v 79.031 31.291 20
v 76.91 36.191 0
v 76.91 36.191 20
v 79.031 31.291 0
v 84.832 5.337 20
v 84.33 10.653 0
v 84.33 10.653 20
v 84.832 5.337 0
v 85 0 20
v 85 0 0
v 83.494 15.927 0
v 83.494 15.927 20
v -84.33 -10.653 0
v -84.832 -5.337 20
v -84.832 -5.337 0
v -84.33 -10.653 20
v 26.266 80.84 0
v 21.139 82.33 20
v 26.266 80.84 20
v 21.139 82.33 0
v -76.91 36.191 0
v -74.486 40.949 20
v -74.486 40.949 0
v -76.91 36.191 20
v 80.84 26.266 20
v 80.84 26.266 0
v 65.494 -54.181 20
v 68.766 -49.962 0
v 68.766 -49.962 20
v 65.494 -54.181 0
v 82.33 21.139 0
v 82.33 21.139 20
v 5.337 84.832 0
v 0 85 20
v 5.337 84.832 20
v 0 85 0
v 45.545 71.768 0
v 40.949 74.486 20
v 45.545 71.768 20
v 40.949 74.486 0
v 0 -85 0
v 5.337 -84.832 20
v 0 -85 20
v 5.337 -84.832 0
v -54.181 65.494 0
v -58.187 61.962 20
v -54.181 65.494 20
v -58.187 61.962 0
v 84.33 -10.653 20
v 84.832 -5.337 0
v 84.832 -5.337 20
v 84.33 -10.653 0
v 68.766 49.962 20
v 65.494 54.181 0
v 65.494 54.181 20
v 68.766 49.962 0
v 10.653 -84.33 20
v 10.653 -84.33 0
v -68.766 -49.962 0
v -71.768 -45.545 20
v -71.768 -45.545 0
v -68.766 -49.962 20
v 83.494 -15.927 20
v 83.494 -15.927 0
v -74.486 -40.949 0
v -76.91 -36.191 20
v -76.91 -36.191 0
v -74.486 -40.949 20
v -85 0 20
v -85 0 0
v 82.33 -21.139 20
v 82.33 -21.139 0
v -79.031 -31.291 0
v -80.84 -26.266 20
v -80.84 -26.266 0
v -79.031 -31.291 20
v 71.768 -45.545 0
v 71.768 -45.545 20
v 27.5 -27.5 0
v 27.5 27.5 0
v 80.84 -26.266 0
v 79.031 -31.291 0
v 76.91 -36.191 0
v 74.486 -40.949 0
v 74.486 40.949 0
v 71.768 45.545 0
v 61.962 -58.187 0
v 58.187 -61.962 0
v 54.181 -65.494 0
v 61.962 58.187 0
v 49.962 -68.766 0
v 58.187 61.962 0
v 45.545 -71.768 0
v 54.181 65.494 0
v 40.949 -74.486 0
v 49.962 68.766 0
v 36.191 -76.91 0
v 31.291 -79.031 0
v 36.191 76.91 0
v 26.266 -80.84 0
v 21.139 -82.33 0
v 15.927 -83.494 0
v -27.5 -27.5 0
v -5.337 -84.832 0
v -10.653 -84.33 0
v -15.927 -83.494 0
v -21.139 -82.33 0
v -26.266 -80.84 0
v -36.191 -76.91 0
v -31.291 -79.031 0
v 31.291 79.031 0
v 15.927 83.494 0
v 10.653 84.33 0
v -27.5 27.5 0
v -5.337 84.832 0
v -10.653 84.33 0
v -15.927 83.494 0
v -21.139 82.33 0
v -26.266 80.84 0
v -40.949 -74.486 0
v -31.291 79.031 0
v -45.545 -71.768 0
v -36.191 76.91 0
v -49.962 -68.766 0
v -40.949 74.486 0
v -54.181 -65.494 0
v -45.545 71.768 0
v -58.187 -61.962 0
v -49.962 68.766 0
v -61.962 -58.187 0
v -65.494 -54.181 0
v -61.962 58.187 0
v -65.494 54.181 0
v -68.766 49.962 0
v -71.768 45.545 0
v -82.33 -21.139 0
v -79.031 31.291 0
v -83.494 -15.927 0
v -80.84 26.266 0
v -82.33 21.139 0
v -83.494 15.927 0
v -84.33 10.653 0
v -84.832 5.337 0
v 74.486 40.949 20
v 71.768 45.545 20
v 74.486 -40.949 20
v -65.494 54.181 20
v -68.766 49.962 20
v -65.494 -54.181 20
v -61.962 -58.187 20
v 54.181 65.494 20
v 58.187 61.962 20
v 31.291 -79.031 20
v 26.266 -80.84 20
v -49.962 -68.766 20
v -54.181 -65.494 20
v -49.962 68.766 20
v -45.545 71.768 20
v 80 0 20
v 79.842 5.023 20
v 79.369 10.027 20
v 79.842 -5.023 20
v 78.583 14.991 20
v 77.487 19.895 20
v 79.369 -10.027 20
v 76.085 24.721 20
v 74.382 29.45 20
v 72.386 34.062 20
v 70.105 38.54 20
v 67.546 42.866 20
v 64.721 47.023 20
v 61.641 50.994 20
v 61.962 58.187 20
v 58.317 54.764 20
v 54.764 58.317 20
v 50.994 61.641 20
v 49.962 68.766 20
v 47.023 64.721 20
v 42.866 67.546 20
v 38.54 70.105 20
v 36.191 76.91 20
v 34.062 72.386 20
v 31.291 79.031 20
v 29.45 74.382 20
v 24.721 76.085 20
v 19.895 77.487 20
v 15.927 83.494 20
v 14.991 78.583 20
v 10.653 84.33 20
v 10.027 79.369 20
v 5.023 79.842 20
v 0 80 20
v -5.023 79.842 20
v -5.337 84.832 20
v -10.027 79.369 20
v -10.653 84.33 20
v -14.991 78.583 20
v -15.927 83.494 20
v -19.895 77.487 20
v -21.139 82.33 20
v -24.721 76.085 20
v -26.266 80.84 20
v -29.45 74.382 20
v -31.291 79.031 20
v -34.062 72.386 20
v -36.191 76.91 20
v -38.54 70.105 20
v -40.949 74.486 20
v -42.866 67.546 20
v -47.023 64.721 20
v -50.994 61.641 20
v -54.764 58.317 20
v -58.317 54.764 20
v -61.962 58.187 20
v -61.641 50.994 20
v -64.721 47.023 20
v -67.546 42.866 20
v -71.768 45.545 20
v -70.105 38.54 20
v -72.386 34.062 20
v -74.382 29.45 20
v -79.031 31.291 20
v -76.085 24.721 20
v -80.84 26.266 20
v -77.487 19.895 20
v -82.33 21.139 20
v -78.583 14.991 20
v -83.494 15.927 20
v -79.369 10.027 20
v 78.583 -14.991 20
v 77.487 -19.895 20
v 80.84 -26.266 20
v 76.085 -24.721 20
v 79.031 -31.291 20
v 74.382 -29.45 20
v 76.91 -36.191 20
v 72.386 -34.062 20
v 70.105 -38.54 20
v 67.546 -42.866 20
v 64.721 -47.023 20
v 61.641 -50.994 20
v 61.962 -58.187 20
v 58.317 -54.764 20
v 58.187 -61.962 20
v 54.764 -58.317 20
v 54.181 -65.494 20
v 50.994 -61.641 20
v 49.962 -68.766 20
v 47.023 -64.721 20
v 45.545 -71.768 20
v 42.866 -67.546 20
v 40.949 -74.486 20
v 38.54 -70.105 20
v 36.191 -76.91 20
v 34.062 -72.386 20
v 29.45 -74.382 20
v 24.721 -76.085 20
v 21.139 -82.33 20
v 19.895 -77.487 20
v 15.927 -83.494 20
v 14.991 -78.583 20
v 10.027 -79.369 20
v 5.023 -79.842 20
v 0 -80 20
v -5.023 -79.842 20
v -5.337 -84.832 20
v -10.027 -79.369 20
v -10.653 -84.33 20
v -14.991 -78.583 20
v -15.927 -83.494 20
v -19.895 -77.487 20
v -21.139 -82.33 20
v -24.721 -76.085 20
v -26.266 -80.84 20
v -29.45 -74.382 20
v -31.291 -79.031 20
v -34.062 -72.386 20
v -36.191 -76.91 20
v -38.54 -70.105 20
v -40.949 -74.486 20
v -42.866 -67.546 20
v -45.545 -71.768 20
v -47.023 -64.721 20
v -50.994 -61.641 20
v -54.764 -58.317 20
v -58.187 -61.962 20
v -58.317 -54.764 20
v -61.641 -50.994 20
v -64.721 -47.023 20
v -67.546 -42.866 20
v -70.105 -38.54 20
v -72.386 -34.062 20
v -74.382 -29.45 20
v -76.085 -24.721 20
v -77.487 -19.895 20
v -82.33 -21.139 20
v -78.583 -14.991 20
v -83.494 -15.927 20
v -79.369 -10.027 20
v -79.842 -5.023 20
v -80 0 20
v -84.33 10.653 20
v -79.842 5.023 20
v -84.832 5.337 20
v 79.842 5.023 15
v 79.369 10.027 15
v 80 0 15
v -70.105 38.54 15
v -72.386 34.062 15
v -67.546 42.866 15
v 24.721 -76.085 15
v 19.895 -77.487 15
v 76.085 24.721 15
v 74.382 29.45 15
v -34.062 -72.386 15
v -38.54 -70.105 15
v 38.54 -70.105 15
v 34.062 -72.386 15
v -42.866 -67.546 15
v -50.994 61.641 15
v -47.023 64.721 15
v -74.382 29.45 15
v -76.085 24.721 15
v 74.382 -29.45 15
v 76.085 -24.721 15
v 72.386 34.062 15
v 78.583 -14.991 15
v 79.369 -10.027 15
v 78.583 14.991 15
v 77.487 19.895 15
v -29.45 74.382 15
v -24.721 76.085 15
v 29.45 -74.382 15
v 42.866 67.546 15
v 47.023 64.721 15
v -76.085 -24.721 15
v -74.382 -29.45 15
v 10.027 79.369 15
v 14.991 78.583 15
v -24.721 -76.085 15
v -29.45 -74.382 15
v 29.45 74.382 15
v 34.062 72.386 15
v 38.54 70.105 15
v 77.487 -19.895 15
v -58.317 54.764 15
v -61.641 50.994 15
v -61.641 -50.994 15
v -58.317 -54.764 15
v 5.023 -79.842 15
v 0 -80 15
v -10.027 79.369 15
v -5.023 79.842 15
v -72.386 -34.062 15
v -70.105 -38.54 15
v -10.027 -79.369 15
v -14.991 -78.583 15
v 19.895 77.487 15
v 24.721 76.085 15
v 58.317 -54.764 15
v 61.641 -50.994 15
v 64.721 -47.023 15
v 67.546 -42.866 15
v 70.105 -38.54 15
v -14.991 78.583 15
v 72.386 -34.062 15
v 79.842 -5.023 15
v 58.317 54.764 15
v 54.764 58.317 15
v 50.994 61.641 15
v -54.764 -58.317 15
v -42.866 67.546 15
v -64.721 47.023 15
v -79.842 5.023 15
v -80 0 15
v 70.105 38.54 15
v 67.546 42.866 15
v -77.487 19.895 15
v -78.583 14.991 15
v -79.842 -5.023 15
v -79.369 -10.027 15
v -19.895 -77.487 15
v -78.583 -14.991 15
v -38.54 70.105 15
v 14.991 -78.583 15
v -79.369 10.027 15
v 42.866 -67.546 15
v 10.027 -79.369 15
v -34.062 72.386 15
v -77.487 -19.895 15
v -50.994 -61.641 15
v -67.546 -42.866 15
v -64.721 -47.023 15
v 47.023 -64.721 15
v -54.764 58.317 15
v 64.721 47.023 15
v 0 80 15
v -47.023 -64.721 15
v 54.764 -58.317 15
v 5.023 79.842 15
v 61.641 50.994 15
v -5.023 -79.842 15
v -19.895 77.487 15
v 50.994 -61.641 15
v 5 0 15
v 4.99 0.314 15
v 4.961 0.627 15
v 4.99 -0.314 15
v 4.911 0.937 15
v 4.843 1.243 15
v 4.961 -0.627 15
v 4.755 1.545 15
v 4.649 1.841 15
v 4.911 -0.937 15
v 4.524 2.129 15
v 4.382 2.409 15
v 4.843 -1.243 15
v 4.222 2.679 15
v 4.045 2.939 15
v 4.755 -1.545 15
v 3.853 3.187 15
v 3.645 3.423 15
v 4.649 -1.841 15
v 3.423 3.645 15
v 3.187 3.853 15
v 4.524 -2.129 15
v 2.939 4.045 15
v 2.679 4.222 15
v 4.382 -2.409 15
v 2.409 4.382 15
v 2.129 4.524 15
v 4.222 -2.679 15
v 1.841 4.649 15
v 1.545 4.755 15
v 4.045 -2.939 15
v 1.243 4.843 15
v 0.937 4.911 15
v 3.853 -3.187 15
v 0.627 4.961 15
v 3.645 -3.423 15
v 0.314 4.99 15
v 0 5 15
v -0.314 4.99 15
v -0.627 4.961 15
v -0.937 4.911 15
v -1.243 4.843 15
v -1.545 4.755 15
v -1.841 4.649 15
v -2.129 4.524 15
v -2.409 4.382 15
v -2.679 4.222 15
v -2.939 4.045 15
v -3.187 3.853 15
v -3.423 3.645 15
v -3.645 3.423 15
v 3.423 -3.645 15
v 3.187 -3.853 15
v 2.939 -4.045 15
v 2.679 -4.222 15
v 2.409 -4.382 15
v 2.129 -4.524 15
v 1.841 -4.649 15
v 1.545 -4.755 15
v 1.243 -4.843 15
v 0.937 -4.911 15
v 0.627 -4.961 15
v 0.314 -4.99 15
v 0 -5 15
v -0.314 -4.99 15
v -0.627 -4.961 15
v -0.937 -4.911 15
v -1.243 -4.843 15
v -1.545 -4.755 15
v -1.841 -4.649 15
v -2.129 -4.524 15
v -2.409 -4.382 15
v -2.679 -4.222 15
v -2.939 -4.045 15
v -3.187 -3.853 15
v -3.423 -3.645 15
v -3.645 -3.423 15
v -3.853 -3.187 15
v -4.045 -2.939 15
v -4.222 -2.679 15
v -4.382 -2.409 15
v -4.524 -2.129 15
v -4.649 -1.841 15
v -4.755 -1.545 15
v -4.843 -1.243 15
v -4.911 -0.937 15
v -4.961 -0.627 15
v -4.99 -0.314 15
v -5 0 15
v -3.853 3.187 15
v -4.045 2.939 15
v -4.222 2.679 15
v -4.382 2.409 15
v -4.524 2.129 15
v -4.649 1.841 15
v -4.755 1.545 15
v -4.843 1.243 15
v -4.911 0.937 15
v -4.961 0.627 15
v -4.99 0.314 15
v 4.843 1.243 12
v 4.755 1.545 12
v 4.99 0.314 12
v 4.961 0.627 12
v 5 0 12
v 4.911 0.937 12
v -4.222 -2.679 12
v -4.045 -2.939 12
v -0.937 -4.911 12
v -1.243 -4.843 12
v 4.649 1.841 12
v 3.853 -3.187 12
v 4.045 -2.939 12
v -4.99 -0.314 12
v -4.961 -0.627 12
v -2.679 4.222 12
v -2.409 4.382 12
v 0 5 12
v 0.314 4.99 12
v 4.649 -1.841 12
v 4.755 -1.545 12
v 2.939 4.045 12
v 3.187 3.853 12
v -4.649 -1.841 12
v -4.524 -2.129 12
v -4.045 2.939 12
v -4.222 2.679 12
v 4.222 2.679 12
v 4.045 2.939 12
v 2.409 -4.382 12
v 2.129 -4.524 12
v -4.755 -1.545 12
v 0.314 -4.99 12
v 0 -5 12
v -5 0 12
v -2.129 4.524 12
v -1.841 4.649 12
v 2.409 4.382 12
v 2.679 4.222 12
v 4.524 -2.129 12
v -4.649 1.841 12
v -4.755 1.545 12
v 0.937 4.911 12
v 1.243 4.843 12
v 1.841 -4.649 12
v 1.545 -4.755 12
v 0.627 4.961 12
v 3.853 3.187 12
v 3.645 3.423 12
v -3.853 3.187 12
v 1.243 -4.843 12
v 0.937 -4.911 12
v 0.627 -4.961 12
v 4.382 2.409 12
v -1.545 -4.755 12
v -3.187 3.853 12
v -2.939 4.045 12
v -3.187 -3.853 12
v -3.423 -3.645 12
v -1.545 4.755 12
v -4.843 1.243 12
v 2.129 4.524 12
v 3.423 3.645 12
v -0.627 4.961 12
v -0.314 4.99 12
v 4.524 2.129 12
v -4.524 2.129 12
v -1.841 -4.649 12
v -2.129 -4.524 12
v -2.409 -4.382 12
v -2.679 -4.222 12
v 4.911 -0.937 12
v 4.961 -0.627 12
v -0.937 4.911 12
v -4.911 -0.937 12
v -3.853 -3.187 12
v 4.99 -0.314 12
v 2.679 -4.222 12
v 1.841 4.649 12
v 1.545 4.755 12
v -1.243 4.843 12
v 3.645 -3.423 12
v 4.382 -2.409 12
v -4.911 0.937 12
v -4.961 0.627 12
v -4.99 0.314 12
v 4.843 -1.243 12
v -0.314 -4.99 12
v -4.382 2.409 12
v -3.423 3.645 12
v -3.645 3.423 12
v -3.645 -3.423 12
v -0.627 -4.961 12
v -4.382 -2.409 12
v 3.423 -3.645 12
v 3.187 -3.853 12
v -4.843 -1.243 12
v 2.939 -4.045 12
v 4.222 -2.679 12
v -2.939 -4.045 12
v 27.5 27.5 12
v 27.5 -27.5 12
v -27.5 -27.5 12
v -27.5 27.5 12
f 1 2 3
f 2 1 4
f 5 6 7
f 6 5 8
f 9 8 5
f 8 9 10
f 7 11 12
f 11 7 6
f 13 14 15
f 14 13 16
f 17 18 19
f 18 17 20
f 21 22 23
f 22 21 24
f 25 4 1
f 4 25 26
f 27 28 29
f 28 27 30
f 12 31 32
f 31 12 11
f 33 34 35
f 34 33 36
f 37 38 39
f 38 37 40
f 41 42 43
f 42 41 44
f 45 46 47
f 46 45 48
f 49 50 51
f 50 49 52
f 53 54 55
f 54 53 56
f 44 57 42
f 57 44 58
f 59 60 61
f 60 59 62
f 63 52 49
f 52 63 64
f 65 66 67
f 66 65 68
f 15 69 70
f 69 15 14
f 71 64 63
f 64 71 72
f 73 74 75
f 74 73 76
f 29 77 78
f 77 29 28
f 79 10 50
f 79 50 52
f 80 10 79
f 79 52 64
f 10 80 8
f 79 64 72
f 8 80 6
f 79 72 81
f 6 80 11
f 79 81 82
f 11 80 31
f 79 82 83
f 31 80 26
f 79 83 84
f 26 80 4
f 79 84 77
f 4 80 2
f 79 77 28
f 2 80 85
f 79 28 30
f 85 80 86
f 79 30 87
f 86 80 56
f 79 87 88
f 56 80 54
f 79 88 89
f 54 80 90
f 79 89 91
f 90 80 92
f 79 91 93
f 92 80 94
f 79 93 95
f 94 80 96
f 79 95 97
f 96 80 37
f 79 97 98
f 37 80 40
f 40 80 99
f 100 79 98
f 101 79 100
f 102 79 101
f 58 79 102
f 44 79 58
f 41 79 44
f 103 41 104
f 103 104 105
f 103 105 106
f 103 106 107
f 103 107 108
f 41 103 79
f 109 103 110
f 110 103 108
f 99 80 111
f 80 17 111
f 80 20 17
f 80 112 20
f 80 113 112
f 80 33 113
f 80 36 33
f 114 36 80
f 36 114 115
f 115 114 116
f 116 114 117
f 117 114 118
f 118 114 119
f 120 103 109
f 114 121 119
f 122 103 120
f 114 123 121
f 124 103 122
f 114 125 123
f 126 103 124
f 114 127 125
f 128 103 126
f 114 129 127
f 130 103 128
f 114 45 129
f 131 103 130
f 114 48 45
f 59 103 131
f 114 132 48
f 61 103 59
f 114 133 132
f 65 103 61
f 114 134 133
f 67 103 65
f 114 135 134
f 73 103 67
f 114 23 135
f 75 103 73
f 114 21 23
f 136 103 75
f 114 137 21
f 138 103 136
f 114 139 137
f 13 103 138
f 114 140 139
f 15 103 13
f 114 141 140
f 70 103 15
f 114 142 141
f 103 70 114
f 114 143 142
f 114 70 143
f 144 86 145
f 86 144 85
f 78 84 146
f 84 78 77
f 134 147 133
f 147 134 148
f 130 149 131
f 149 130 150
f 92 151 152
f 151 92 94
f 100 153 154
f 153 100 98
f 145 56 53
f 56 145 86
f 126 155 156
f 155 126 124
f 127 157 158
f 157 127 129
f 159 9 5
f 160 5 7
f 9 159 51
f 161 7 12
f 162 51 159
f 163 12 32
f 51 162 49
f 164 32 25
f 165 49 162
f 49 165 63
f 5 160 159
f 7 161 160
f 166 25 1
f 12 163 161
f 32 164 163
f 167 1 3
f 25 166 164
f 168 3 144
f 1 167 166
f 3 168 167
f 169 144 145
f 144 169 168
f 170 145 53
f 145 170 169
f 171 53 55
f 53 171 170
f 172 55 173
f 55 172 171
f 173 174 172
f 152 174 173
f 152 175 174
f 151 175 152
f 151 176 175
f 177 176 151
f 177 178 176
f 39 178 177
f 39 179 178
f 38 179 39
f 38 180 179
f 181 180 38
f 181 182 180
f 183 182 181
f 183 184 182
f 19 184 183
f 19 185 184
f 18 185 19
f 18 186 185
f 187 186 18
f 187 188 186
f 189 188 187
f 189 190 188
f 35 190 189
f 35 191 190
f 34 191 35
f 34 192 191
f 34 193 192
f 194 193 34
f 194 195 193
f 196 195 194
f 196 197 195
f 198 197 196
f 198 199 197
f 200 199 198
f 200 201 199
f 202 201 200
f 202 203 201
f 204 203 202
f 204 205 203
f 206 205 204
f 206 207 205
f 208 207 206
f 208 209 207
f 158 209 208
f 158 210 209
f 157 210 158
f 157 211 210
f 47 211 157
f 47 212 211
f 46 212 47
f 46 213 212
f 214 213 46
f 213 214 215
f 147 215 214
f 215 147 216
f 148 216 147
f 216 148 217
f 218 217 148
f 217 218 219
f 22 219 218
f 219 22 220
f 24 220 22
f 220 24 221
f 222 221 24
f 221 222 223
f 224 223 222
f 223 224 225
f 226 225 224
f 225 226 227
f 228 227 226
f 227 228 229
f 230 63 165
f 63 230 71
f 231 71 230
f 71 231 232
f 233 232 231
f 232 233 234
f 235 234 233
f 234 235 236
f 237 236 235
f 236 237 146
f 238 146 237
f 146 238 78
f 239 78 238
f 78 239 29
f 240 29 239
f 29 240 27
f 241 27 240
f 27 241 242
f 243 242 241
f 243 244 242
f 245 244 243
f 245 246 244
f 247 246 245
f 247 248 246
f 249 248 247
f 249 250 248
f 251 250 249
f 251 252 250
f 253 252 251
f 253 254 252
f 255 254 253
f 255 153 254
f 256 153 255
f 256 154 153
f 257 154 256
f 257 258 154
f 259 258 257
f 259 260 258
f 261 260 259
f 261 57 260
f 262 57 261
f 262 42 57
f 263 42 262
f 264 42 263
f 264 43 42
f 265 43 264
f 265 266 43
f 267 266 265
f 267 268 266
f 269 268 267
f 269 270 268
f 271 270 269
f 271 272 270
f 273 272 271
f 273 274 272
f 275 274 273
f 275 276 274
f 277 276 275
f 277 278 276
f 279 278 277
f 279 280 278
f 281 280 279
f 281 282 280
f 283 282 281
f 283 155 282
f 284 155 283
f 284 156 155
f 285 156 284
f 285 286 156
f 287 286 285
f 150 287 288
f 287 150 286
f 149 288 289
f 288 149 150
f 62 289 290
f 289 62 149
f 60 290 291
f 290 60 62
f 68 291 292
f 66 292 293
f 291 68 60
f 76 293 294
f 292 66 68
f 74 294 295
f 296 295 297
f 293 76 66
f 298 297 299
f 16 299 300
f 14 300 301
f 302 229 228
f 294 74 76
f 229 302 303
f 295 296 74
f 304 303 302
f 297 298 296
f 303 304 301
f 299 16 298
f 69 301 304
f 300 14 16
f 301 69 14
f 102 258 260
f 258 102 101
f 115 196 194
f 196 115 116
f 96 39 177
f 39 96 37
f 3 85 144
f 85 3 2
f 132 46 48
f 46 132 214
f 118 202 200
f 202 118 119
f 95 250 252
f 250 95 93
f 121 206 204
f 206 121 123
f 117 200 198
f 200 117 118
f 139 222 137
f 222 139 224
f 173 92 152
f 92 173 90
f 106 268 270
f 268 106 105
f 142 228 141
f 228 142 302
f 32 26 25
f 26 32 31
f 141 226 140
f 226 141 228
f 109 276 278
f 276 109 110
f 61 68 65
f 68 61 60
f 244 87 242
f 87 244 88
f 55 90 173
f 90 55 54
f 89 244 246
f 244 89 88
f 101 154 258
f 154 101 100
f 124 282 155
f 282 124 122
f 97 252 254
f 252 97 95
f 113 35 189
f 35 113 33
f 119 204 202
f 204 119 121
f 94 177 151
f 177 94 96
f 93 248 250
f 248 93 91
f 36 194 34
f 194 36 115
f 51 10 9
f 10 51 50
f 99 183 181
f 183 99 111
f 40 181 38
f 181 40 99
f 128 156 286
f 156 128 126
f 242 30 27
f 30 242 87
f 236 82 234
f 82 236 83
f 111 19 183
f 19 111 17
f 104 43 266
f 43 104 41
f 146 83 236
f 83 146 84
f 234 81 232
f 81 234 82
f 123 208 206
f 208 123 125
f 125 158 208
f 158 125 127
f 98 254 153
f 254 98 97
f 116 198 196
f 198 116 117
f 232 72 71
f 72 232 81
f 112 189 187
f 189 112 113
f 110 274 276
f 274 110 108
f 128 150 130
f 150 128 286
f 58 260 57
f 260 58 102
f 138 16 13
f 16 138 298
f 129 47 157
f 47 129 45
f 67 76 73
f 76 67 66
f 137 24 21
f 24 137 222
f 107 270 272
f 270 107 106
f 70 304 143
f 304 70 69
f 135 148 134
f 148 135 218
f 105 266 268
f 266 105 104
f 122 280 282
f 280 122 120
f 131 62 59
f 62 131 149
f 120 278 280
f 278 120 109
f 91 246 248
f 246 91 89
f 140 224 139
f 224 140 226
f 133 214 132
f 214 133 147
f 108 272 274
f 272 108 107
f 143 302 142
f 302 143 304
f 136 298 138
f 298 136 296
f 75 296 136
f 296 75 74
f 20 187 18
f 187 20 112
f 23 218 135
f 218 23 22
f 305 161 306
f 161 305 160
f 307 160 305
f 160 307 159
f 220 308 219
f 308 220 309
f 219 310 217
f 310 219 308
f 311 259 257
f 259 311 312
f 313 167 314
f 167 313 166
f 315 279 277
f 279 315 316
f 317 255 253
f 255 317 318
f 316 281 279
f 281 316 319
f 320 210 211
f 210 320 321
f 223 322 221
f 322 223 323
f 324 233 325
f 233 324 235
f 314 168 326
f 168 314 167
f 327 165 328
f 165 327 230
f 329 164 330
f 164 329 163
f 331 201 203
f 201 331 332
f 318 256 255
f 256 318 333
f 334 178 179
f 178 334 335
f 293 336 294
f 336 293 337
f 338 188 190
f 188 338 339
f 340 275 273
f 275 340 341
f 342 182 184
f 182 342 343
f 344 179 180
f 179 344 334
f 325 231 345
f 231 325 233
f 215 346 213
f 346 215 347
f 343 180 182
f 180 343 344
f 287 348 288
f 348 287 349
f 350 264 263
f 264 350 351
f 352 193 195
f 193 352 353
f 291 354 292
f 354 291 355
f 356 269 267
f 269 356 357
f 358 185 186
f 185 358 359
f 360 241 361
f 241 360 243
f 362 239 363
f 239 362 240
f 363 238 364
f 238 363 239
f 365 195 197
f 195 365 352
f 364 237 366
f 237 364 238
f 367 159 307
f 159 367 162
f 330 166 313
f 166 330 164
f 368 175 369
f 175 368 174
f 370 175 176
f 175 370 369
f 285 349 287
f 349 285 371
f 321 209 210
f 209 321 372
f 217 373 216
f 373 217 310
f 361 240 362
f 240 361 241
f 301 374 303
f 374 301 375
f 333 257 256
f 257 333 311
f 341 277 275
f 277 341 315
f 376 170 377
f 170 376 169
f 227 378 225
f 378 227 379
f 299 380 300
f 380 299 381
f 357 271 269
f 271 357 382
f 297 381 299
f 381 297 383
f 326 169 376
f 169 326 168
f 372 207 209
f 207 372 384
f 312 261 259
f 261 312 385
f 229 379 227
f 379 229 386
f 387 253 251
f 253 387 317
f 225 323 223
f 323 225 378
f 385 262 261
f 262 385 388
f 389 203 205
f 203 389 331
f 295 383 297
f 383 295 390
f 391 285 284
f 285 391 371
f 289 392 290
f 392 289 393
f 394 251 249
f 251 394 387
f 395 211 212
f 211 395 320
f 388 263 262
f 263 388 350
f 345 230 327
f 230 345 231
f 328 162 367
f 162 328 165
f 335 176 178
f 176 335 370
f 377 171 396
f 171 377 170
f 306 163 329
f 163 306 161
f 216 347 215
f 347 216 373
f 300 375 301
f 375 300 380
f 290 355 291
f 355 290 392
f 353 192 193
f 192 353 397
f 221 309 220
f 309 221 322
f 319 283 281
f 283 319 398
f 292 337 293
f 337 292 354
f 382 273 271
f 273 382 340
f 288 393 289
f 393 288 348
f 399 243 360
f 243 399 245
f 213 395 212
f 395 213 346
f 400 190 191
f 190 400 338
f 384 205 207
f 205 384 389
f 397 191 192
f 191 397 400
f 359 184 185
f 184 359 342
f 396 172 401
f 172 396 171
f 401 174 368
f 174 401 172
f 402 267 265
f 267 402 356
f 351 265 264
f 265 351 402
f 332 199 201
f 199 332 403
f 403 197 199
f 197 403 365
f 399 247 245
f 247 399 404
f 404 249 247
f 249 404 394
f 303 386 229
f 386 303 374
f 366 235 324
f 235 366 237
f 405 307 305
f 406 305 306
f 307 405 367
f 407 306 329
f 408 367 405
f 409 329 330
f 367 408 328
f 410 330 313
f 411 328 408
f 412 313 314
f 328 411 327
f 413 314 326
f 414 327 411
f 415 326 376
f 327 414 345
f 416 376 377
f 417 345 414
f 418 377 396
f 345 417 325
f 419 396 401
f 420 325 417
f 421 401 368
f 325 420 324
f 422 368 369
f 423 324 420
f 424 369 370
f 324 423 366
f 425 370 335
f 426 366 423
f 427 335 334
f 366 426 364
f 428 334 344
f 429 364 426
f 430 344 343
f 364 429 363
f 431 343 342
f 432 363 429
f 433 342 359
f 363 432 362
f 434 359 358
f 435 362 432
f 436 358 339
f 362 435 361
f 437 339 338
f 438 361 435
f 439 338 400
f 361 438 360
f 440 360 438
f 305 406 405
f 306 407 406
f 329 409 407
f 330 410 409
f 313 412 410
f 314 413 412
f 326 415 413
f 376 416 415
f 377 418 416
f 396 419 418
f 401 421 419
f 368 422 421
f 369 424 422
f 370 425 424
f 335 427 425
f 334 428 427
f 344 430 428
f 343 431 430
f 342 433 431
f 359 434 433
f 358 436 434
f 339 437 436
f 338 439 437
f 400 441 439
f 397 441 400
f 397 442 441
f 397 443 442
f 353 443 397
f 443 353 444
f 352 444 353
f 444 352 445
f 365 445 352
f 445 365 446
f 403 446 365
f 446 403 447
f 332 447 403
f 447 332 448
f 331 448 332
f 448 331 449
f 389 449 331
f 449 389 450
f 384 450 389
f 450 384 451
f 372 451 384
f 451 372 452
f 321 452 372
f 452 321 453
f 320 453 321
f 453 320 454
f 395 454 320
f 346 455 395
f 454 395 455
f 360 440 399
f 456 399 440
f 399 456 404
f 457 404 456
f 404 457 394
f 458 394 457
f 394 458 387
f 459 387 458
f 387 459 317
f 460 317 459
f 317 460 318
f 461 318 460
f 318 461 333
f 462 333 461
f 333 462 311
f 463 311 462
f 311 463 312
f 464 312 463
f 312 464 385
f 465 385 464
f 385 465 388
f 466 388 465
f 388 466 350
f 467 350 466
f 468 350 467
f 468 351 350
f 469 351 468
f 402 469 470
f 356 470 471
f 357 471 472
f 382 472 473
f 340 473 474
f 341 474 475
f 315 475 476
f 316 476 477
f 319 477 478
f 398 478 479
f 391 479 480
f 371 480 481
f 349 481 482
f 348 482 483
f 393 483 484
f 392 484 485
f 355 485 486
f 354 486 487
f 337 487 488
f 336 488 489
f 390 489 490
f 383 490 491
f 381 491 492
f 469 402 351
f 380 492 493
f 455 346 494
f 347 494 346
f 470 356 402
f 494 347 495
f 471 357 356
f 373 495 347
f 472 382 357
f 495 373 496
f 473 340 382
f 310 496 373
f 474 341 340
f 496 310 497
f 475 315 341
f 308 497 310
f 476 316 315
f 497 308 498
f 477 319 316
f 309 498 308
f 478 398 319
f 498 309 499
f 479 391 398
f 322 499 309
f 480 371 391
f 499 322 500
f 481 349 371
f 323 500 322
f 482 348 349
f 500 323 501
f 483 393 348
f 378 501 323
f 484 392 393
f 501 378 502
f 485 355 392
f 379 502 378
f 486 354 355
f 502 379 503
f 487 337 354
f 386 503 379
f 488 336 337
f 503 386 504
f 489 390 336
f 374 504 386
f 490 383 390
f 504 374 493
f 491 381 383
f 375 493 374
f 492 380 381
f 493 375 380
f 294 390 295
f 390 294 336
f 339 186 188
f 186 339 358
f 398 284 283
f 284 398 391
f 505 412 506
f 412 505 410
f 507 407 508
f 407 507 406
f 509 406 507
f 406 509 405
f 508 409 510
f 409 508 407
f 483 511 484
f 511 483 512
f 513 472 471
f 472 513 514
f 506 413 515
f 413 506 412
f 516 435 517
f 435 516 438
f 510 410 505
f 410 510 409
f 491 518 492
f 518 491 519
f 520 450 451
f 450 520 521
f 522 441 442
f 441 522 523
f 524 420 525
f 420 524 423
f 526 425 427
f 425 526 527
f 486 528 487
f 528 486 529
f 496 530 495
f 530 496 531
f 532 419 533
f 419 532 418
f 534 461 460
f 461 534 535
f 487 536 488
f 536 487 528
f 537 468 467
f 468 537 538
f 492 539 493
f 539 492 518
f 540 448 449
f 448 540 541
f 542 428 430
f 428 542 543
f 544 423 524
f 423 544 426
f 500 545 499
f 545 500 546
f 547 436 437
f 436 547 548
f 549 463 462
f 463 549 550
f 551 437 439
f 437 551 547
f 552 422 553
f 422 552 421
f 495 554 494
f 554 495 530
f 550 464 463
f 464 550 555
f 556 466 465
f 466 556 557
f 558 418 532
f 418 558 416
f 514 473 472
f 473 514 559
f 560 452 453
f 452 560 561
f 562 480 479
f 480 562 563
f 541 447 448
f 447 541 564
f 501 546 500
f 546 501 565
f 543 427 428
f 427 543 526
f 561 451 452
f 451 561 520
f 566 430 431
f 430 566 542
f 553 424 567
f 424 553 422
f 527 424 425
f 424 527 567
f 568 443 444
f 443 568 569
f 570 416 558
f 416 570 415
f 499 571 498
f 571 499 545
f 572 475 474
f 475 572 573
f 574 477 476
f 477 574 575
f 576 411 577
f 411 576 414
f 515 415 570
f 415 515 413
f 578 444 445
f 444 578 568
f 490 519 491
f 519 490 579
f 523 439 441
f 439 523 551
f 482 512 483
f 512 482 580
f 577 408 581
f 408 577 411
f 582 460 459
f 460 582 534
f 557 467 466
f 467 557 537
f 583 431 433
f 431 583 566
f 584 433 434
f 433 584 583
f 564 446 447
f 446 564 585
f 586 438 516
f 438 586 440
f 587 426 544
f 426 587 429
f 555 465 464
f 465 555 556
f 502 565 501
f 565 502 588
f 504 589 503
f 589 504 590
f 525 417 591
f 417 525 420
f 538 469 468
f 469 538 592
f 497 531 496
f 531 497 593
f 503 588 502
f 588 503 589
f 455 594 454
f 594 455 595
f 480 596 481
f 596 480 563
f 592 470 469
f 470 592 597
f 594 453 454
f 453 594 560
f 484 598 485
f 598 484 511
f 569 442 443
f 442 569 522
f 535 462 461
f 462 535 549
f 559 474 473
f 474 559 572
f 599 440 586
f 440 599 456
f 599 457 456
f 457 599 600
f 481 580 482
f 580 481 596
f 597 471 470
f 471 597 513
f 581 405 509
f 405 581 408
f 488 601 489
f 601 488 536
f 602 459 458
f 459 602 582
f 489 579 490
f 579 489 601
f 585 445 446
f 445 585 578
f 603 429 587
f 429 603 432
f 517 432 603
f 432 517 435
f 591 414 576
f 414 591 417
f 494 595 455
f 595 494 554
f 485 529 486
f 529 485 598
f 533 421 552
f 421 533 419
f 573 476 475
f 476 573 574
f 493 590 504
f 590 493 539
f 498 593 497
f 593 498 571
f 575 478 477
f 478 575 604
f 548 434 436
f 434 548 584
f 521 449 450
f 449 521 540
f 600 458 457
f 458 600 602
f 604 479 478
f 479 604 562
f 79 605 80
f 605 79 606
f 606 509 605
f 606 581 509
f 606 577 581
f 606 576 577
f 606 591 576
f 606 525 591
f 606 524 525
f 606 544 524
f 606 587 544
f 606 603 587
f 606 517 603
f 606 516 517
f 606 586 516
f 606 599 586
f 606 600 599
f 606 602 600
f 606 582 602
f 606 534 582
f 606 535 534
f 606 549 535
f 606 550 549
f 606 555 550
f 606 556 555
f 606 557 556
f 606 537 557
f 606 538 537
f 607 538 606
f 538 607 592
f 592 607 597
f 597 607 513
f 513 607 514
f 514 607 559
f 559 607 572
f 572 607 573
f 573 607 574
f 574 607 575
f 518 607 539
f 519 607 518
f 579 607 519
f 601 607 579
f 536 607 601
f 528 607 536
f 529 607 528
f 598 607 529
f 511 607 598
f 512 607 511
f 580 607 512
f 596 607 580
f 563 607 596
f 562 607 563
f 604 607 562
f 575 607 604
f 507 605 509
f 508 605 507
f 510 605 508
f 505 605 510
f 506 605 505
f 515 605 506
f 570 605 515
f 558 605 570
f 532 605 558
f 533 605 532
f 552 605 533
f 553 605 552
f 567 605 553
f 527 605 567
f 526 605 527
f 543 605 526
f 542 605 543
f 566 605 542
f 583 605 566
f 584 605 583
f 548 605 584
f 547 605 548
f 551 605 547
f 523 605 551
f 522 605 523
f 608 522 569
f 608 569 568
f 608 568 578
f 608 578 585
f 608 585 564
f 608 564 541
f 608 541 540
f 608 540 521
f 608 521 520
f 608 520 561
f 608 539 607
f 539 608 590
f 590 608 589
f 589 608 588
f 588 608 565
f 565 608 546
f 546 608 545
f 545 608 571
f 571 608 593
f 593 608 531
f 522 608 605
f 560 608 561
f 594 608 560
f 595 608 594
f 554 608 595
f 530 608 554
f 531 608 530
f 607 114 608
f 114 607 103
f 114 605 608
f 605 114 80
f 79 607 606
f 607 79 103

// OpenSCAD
// Simple parametric clock inspired by user image
$fn=100;

// -------------------------
// RENDER MODE SELECTION
// -------------------------
// Change this value to render different parts:
// 0 = Full assembly preview (all parts together)
// 1 = Housing only (for 3D printing)
// 2 = Topography disc only (for 3D printing)
// 3 = Hour markers only (for 3D printing)
// 4 = Hands only (for 3D printing)
// 5 = Base only (for 3D printing)
// 6 = Exploded view (all parts separated)
render_mode = 1;

// Function to create flowing topographic contours
module flowing_contour(center_x, center_y, base_r, num_lines, line_width, height_start) {
    for(i=[0:num_lines-1]) {
        radius = base_r + i * 3;
        height = height_start + i * 0.3;
        
        translate([center_x, center_y, 0])
            linear_extrude(height=height)
                difference() {
                    polygon([
                        for(a=[0:5:360]) 
                            let(angle=a,
                                wave1=2 * sin(a * 2 + i * 30),
                                wave2=1.5 * cos(a * 3 + i * 20))
                            [(radius + line_width/2 + wave1 + wave2) * cos(angle), 
                             (radius + line_width/2 + wave1 + wave2) * sin(angle)]
                    ]);
                    polygon([
                        for(a=[0:5:360]) 
                            let(angle=a,
                                wave1=2 * sin(a * 2 + i * 30),
                                wave2=1.5 * cos(a * 3 + i * 20))
                            [(radius - line_width/2 + wave1 + wave2) * cos(angle), 
                             (radius - line_width/2 + wave1 + wave2) * sin(angle)]
                    ]);
                }
    }
}

module topography_disc(r=80, thickness=4, center_hole_d=3){
    difference() {
        union() {
            // Base disc
            cylinder(r=r, h=thickness);
            
            // Top-left terrain cluster (around 10-11 o'clock)
            flowing_contour(-25, 35, 8, 8, 1.2, thickness + 0.3);
            
            // Top-right terrain cluster (around 1-2 o'clock)
            flowing_contour(30, 30, 10, 7, 1.2, thickness + 0.3);
            
            // Bottom-left terrain cluster (around 7-8 o'clock)
            flowing_contour(-30, -25, 9, 6, 1.2, thickness + 0.3);
            
            // Bottom-right terrain cluster (around 4-5 o'clock)
            flowing_contour(28, -30, 11, 7, 1.2, thickness + 0.3);
            
            // Center cluster
            flowing_contour(0, 0, 6, 5, 1.2, thickness + 0.2);
            
            // Additional smaller clusters for variety
            flowing_contour(45, 0, 7, 4, 1.0, thickness + 0.2);
            flowing_contour(-40, 0, 6, 4, 1.0, thickness + 0.2);
            flowing_contour(0, 45, 5, 3, 1.0, thickness + 0.2);
            flowing_contour(0, -40, 6, 3, 1.0, thickness + 0.2);
        }
        
        // Center hole for clock mechanism
        translate([0, 0, -1])
            cylinder(d=center_hole_d, h=thickness + 10);
        
        // Keep within disc bounds
        translate([0, 0, -1])
            difference() {
                cylinder(r=r + 10, h=thickness + 10);
                cylinder(r=r, h=thickness + 10);
            }
    }
}

module hour_markers(r=80){
    for(angle=[0,90,180,270]){
        rotate([0,0,angle])
            translate([r-10,0,2])
                cube([20,6,4], center=true);
    }
}

module hands(){
    // simplified hands
    color("gray") translate([0,0,5])
        cube([60,6,2], center=true); // minute
    color("gray") translate([0,0,4])
        cube([40,6,2], center=true); // hour
}

module housing(r=85, depth=20, clockwork_slot_size=55, rim_width=5, disc_recess_depth=5){
    difference(){
        // Main body
        cylinder(r=r, h=depth);
        
        // Front recess for disc (shallow circular pocket)
        translate([0, 0, depth - disc_recess_depth])
            cylinder(r=r - rim_width, h=disc_recess_depth + 1);
        
        // Center hole for clock shaft
        translate([0, 0, -1])
            cylinder(d=10, h=depth + 2);
        
        // Square slot for clock mechanism on the back (5.5cm x 5.5cm)
        translate([-clockwork_slot_size/2, -clockwork_slot_size/2, -1])
            cube([clockwork_slot_size, clockwork_slot_size, depth - disc_recess_depth - 2]);
    }
}

module base(w=160,d=40,h=10){
    cube([w,d,h], center=true);
}

module clock(){
    housing();
    translate([0,0,0])
        topography_disc();
    hour_markers();
    hands();
    translate([0, -50, -5])
        base();
}

// -------------------------
// Render Selection
// -------------------------
if (render_mode == 0) {
    // Mode 0: Full assembly preview
    clock();
    
} else if (render_mode == 1) {
    // Mode 1: Housing only
    housing();
    
} else if (render_mode == 2) {
    // Mode 2: Topography disc only
    topography_disc();
    
} else if (render_mode == 3) {
    // Mode 3: Hour markers only (all 4 combined)
    hour_markers();
    
} else if (render_mode == 4) {
    // Mode 4: Hands only (both minute and hour)
    hands();
    
} else if (render_mode == 5) {
    // Mode 5: Base only
    base();
    
} else if (render_mode == 6) {
    // Mode 6: Exploded view
    translate([0, 0, 40])
        housing();
    translate([0, 0, 30])
        topography_disc();
    translate([0, 0, 20])
        hour_markers();
    translate([0, 0, 10])
        hands();
    translate([0, -50, 0])
        base();
}
